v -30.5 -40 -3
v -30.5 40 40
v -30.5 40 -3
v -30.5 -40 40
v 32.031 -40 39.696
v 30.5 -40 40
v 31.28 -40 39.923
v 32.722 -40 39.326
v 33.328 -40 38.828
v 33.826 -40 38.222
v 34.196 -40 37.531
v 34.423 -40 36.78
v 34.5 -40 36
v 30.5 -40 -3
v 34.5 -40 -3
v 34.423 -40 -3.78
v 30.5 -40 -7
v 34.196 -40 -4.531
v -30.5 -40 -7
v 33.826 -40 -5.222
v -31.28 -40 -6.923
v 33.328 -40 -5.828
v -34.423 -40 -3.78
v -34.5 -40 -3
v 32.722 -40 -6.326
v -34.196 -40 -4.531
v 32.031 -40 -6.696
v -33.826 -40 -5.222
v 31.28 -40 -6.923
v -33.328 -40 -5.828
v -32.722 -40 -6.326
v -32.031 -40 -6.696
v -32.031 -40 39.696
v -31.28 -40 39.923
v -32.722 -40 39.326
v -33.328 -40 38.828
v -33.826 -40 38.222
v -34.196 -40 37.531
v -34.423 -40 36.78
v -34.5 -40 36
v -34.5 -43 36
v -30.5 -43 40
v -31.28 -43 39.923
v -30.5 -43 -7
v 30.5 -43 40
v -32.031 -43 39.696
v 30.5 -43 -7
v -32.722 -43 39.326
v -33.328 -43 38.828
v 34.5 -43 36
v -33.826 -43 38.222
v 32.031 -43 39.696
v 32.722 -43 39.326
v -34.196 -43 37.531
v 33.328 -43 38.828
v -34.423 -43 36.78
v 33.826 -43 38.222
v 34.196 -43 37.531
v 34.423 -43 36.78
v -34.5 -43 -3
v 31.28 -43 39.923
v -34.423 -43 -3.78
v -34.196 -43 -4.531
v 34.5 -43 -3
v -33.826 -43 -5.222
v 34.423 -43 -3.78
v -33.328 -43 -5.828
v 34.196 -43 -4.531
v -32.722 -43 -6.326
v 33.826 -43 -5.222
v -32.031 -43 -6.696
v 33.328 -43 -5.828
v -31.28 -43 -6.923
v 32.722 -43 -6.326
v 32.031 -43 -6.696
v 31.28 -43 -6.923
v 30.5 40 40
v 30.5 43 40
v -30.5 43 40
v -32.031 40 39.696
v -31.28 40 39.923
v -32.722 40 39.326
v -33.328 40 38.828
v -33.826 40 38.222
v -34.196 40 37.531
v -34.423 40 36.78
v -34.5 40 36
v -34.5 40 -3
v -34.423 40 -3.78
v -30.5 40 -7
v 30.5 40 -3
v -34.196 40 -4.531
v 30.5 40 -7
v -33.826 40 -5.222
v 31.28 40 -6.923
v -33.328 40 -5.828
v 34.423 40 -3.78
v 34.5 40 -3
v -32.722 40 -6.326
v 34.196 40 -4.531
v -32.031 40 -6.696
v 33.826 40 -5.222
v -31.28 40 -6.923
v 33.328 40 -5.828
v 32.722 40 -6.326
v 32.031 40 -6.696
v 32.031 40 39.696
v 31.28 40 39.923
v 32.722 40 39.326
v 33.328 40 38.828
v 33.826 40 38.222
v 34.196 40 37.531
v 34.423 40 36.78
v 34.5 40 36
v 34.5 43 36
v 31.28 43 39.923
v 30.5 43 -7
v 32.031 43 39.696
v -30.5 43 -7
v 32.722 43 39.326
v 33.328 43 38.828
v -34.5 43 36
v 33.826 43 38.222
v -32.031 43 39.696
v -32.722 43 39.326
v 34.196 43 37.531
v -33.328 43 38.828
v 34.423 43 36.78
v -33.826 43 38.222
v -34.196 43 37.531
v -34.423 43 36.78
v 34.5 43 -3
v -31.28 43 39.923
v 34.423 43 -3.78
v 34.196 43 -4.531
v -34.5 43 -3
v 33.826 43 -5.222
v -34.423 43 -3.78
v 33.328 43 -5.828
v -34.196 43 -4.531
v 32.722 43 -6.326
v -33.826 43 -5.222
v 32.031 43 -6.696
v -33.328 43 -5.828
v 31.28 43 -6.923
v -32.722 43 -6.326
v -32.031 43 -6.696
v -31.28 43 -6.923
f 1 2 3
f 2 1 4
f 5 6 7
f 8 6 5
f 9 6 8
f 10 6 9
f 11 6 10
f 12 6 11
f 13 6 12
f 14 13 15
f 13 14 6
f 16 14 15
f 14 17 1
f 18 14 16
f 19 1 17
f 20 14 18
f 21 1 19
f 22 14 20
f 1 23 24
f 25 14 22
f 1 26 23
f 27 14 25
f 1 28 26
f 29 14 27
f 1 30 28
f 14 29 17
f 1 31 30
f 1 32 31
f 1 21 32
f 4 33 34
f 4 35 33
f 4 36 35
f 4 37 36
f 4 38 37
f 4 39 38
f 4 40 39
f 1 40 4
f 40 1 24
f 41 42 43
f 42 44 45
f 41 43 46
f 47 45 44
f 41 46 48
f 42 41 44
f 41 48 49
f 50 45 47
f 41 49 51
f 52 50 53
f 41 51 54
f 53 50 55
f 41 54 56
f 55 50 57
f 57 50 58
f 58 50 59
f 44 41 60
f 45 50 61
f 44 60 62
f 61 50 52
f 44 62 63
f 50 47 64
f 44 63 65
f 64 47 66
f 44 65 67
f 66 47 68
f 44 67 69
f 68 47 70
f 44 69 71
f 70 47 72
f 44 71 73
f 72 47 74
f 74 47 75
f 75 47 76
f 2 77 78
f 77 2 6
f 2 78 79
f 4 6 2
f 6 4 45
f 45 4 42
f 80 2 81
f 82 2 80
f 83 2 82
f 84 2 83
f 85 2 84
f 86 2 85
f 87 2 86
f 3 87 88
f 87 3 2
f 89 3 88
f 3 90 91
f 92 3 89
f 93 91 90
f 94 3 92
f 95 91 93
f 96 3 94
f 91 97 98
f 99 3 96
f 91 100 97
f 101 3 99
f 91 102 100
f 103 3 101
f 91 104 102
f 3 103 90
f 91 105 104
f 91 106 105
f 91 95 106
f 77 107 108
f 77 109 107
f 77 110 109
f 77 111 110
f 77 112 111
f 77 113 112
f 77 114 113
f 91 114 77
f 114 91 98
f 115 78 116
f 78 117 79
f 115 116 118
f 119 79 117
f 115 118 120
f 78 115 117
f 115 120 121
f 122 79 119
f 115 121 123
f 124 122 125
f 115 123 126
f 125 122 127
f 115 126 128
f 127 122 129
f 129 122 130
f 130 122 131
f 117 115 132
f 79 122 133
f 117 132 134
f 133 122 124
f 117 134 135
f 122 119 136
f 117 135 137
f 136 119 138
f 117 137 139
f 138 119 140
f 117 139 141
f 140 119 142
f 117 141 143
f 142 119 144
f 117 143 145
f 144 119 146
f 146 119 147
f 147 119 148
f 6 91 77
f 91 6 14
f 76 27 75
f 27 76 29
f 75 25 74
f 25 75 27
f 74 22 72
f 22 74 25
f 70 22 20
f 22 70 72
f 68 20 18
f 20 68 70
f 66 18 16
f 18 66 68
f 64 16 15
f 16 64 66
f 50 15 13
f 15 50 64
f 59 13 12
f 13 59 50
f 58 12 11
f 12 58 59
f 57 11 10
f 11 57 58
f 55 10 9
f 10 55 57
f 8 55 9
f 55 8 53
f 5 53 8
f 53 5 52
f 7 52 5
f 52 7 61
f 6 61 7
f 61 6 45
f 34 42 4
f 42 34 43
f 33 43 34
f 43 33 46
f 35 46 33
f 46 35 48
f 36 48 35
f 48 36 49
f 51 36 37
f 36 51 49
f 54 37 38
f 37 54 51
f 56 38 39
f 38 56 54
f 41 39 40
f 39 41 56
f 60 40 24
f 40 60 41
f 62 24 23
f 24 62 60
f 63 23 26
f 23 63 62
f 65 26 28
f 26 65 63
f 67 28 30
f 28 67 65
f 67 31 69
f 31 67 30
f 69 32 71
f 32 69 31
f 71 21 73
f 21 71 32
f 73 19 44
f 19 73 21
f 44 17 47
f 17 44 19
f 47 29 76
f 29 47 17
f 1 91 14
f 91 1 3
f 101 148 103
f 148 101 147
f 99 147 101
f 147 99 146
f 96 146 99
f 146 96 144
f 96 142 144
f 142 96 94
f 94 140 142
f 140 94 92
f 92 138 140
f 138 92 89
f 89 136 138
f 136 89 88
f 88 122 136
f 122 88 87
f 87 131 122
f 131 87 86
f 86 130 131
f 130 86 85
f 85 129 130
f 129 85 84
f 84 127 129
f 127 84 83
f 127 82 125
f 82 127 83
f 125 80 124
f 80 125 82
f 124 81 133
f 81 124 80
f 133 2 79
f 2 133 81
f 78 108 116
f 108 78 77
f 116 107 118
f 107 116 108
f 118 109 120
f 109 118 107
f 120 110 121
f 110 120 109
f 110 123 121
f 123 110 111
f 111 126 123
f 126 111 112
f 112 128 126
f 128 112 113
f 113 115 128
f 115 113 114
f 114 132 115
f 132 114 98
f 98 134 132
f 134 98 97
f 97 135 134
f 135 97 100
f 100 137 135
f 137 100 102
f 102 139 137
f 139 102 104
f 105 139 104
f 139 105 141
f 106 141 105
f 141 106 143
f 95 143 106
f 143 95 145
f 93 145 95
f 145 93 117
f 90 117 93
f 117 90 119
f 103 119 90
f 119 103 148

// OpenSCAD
// file: side_panel.scad
include <./dimensions.scad>;

width = internal[2];
height = internal[1];

module SidePanel() {
  // Main
  square([width, height], center=true);

  // Tabs
  for(x = side_panel_tab_positions) {
    translate([x, 0]) {
      square([side_panel_tab_width, height + (frontback_panel_thickness * 2)], center=true);
    }
  }
}

module SidePanel3D() {
  linear_extrude(height = side_panel_thickness) {
    SidePanel();
  }
}

SidePanel();
// file: frontback_panel.scad
include <./dimensions.scad>;

width = internal[0] + (side_panel_thickness * 2) + 8;
height_offset = bottom_panel_thickness + 4;
height = internal[2] + height_offset;

module FrontBackPanel() {
  translate([0, -height_offset / 2]) {
    difference() {
      // Main
      minkowski() {
        d = 8;
        square([width - d, height - d], center=true);
        circle(d = d, $fn = 32);
      }

      // Side panel tab slots
      dx = (internal[0] + side_panel_thickness) / 2;
      for(x = [-dx, dx]) {
        for(y = side_panel_tab_positions) {
          translate([x, y + (height_offset / 2)]) {
            square([side_panel_thickness, side_panel_tab_width], center=true);
          }
        }
      }

      // Bottom panel tab slots
      for(x = bottom_panel_tab_positions) {
        translate([x, (-internal[2] + height_offset - bottom_panel_thickness) / 2]) {
          square([bottom_panel_tab_width, bottom_panel_thickness], center=true);
        }
      }
    }
  }
}

module FrontBackPanel3D() {
  linear_extrude(height = frontback_panel_thickness) {
    FrontBackPanel();
  }
}

FrontBackPanel();
// file: bottom_panel.scad
include <./dimensions.scad>;

width = internal[0] + (side_panel_thickness * 2);
height = internal[1];

module BottomPanel() {
  // Main
  square([width, height], center=true);

  // Tabs
  for(x = bottom_panel_tab_positions) {
    translate([x, 0]) {
      square([bottom_panel_tab_width, height + (frontback_panel_thickness * 2)], center=true);
    }
  }
}

module BottomPanel3D() {
  linear_extrude(height = bottom_panel_thickness) {
    BottomPanel();
  }
}

BottomPanel();
// file: dimensions.scad
internal = [55, 80, 40];

bottom_panel_thickness = 3;
frontback_panel_thickness = 3;
side_panel_thickness = 3;

bottom_panel_tab_width = 15;
bottom_panel_tab_positions = [-15, 15];

side_panel_tab_width = 8;
side_panel_tab_positions = [-10, 10];
// main file
include <./dimensions.scad>;
use <./bottom_panel.scad>;
use <./frontback_panel.scad>;
use <./side_panel.scad>;

// Bottom panel
color("orange") {
  translate([0, 0, -bottom_panel_thickness]) {
    BottomPanel3D();
  }
}

// Side panels
color("green") {
  translate([0, 0, internal[2] / 2]) {
    for(a = [-90, 90]) {
      rotate([0, a, 0]) {
        translate([0, 0, internal[0] / 2]) {
          SidePanel3D();
        }
      }
    }
  }
}

// Front and back panels
color("blue") {
  translate([0, 0, internal[2] / 2]) {
    for(a = [0, 180]) {
      rotate([0, 0, a]) {
        translate([0, -internal[1] / 2, 0]) {
          rotate([90, 0, 0]) {
            FrontBackPanel3D();
          }
        }
      }
    }
  }
}

// Internal area
color("magenta", 0.3) {
  translate([0, 0, internal[2]/2]) {
    cube(internal, center=true);
  }
}
